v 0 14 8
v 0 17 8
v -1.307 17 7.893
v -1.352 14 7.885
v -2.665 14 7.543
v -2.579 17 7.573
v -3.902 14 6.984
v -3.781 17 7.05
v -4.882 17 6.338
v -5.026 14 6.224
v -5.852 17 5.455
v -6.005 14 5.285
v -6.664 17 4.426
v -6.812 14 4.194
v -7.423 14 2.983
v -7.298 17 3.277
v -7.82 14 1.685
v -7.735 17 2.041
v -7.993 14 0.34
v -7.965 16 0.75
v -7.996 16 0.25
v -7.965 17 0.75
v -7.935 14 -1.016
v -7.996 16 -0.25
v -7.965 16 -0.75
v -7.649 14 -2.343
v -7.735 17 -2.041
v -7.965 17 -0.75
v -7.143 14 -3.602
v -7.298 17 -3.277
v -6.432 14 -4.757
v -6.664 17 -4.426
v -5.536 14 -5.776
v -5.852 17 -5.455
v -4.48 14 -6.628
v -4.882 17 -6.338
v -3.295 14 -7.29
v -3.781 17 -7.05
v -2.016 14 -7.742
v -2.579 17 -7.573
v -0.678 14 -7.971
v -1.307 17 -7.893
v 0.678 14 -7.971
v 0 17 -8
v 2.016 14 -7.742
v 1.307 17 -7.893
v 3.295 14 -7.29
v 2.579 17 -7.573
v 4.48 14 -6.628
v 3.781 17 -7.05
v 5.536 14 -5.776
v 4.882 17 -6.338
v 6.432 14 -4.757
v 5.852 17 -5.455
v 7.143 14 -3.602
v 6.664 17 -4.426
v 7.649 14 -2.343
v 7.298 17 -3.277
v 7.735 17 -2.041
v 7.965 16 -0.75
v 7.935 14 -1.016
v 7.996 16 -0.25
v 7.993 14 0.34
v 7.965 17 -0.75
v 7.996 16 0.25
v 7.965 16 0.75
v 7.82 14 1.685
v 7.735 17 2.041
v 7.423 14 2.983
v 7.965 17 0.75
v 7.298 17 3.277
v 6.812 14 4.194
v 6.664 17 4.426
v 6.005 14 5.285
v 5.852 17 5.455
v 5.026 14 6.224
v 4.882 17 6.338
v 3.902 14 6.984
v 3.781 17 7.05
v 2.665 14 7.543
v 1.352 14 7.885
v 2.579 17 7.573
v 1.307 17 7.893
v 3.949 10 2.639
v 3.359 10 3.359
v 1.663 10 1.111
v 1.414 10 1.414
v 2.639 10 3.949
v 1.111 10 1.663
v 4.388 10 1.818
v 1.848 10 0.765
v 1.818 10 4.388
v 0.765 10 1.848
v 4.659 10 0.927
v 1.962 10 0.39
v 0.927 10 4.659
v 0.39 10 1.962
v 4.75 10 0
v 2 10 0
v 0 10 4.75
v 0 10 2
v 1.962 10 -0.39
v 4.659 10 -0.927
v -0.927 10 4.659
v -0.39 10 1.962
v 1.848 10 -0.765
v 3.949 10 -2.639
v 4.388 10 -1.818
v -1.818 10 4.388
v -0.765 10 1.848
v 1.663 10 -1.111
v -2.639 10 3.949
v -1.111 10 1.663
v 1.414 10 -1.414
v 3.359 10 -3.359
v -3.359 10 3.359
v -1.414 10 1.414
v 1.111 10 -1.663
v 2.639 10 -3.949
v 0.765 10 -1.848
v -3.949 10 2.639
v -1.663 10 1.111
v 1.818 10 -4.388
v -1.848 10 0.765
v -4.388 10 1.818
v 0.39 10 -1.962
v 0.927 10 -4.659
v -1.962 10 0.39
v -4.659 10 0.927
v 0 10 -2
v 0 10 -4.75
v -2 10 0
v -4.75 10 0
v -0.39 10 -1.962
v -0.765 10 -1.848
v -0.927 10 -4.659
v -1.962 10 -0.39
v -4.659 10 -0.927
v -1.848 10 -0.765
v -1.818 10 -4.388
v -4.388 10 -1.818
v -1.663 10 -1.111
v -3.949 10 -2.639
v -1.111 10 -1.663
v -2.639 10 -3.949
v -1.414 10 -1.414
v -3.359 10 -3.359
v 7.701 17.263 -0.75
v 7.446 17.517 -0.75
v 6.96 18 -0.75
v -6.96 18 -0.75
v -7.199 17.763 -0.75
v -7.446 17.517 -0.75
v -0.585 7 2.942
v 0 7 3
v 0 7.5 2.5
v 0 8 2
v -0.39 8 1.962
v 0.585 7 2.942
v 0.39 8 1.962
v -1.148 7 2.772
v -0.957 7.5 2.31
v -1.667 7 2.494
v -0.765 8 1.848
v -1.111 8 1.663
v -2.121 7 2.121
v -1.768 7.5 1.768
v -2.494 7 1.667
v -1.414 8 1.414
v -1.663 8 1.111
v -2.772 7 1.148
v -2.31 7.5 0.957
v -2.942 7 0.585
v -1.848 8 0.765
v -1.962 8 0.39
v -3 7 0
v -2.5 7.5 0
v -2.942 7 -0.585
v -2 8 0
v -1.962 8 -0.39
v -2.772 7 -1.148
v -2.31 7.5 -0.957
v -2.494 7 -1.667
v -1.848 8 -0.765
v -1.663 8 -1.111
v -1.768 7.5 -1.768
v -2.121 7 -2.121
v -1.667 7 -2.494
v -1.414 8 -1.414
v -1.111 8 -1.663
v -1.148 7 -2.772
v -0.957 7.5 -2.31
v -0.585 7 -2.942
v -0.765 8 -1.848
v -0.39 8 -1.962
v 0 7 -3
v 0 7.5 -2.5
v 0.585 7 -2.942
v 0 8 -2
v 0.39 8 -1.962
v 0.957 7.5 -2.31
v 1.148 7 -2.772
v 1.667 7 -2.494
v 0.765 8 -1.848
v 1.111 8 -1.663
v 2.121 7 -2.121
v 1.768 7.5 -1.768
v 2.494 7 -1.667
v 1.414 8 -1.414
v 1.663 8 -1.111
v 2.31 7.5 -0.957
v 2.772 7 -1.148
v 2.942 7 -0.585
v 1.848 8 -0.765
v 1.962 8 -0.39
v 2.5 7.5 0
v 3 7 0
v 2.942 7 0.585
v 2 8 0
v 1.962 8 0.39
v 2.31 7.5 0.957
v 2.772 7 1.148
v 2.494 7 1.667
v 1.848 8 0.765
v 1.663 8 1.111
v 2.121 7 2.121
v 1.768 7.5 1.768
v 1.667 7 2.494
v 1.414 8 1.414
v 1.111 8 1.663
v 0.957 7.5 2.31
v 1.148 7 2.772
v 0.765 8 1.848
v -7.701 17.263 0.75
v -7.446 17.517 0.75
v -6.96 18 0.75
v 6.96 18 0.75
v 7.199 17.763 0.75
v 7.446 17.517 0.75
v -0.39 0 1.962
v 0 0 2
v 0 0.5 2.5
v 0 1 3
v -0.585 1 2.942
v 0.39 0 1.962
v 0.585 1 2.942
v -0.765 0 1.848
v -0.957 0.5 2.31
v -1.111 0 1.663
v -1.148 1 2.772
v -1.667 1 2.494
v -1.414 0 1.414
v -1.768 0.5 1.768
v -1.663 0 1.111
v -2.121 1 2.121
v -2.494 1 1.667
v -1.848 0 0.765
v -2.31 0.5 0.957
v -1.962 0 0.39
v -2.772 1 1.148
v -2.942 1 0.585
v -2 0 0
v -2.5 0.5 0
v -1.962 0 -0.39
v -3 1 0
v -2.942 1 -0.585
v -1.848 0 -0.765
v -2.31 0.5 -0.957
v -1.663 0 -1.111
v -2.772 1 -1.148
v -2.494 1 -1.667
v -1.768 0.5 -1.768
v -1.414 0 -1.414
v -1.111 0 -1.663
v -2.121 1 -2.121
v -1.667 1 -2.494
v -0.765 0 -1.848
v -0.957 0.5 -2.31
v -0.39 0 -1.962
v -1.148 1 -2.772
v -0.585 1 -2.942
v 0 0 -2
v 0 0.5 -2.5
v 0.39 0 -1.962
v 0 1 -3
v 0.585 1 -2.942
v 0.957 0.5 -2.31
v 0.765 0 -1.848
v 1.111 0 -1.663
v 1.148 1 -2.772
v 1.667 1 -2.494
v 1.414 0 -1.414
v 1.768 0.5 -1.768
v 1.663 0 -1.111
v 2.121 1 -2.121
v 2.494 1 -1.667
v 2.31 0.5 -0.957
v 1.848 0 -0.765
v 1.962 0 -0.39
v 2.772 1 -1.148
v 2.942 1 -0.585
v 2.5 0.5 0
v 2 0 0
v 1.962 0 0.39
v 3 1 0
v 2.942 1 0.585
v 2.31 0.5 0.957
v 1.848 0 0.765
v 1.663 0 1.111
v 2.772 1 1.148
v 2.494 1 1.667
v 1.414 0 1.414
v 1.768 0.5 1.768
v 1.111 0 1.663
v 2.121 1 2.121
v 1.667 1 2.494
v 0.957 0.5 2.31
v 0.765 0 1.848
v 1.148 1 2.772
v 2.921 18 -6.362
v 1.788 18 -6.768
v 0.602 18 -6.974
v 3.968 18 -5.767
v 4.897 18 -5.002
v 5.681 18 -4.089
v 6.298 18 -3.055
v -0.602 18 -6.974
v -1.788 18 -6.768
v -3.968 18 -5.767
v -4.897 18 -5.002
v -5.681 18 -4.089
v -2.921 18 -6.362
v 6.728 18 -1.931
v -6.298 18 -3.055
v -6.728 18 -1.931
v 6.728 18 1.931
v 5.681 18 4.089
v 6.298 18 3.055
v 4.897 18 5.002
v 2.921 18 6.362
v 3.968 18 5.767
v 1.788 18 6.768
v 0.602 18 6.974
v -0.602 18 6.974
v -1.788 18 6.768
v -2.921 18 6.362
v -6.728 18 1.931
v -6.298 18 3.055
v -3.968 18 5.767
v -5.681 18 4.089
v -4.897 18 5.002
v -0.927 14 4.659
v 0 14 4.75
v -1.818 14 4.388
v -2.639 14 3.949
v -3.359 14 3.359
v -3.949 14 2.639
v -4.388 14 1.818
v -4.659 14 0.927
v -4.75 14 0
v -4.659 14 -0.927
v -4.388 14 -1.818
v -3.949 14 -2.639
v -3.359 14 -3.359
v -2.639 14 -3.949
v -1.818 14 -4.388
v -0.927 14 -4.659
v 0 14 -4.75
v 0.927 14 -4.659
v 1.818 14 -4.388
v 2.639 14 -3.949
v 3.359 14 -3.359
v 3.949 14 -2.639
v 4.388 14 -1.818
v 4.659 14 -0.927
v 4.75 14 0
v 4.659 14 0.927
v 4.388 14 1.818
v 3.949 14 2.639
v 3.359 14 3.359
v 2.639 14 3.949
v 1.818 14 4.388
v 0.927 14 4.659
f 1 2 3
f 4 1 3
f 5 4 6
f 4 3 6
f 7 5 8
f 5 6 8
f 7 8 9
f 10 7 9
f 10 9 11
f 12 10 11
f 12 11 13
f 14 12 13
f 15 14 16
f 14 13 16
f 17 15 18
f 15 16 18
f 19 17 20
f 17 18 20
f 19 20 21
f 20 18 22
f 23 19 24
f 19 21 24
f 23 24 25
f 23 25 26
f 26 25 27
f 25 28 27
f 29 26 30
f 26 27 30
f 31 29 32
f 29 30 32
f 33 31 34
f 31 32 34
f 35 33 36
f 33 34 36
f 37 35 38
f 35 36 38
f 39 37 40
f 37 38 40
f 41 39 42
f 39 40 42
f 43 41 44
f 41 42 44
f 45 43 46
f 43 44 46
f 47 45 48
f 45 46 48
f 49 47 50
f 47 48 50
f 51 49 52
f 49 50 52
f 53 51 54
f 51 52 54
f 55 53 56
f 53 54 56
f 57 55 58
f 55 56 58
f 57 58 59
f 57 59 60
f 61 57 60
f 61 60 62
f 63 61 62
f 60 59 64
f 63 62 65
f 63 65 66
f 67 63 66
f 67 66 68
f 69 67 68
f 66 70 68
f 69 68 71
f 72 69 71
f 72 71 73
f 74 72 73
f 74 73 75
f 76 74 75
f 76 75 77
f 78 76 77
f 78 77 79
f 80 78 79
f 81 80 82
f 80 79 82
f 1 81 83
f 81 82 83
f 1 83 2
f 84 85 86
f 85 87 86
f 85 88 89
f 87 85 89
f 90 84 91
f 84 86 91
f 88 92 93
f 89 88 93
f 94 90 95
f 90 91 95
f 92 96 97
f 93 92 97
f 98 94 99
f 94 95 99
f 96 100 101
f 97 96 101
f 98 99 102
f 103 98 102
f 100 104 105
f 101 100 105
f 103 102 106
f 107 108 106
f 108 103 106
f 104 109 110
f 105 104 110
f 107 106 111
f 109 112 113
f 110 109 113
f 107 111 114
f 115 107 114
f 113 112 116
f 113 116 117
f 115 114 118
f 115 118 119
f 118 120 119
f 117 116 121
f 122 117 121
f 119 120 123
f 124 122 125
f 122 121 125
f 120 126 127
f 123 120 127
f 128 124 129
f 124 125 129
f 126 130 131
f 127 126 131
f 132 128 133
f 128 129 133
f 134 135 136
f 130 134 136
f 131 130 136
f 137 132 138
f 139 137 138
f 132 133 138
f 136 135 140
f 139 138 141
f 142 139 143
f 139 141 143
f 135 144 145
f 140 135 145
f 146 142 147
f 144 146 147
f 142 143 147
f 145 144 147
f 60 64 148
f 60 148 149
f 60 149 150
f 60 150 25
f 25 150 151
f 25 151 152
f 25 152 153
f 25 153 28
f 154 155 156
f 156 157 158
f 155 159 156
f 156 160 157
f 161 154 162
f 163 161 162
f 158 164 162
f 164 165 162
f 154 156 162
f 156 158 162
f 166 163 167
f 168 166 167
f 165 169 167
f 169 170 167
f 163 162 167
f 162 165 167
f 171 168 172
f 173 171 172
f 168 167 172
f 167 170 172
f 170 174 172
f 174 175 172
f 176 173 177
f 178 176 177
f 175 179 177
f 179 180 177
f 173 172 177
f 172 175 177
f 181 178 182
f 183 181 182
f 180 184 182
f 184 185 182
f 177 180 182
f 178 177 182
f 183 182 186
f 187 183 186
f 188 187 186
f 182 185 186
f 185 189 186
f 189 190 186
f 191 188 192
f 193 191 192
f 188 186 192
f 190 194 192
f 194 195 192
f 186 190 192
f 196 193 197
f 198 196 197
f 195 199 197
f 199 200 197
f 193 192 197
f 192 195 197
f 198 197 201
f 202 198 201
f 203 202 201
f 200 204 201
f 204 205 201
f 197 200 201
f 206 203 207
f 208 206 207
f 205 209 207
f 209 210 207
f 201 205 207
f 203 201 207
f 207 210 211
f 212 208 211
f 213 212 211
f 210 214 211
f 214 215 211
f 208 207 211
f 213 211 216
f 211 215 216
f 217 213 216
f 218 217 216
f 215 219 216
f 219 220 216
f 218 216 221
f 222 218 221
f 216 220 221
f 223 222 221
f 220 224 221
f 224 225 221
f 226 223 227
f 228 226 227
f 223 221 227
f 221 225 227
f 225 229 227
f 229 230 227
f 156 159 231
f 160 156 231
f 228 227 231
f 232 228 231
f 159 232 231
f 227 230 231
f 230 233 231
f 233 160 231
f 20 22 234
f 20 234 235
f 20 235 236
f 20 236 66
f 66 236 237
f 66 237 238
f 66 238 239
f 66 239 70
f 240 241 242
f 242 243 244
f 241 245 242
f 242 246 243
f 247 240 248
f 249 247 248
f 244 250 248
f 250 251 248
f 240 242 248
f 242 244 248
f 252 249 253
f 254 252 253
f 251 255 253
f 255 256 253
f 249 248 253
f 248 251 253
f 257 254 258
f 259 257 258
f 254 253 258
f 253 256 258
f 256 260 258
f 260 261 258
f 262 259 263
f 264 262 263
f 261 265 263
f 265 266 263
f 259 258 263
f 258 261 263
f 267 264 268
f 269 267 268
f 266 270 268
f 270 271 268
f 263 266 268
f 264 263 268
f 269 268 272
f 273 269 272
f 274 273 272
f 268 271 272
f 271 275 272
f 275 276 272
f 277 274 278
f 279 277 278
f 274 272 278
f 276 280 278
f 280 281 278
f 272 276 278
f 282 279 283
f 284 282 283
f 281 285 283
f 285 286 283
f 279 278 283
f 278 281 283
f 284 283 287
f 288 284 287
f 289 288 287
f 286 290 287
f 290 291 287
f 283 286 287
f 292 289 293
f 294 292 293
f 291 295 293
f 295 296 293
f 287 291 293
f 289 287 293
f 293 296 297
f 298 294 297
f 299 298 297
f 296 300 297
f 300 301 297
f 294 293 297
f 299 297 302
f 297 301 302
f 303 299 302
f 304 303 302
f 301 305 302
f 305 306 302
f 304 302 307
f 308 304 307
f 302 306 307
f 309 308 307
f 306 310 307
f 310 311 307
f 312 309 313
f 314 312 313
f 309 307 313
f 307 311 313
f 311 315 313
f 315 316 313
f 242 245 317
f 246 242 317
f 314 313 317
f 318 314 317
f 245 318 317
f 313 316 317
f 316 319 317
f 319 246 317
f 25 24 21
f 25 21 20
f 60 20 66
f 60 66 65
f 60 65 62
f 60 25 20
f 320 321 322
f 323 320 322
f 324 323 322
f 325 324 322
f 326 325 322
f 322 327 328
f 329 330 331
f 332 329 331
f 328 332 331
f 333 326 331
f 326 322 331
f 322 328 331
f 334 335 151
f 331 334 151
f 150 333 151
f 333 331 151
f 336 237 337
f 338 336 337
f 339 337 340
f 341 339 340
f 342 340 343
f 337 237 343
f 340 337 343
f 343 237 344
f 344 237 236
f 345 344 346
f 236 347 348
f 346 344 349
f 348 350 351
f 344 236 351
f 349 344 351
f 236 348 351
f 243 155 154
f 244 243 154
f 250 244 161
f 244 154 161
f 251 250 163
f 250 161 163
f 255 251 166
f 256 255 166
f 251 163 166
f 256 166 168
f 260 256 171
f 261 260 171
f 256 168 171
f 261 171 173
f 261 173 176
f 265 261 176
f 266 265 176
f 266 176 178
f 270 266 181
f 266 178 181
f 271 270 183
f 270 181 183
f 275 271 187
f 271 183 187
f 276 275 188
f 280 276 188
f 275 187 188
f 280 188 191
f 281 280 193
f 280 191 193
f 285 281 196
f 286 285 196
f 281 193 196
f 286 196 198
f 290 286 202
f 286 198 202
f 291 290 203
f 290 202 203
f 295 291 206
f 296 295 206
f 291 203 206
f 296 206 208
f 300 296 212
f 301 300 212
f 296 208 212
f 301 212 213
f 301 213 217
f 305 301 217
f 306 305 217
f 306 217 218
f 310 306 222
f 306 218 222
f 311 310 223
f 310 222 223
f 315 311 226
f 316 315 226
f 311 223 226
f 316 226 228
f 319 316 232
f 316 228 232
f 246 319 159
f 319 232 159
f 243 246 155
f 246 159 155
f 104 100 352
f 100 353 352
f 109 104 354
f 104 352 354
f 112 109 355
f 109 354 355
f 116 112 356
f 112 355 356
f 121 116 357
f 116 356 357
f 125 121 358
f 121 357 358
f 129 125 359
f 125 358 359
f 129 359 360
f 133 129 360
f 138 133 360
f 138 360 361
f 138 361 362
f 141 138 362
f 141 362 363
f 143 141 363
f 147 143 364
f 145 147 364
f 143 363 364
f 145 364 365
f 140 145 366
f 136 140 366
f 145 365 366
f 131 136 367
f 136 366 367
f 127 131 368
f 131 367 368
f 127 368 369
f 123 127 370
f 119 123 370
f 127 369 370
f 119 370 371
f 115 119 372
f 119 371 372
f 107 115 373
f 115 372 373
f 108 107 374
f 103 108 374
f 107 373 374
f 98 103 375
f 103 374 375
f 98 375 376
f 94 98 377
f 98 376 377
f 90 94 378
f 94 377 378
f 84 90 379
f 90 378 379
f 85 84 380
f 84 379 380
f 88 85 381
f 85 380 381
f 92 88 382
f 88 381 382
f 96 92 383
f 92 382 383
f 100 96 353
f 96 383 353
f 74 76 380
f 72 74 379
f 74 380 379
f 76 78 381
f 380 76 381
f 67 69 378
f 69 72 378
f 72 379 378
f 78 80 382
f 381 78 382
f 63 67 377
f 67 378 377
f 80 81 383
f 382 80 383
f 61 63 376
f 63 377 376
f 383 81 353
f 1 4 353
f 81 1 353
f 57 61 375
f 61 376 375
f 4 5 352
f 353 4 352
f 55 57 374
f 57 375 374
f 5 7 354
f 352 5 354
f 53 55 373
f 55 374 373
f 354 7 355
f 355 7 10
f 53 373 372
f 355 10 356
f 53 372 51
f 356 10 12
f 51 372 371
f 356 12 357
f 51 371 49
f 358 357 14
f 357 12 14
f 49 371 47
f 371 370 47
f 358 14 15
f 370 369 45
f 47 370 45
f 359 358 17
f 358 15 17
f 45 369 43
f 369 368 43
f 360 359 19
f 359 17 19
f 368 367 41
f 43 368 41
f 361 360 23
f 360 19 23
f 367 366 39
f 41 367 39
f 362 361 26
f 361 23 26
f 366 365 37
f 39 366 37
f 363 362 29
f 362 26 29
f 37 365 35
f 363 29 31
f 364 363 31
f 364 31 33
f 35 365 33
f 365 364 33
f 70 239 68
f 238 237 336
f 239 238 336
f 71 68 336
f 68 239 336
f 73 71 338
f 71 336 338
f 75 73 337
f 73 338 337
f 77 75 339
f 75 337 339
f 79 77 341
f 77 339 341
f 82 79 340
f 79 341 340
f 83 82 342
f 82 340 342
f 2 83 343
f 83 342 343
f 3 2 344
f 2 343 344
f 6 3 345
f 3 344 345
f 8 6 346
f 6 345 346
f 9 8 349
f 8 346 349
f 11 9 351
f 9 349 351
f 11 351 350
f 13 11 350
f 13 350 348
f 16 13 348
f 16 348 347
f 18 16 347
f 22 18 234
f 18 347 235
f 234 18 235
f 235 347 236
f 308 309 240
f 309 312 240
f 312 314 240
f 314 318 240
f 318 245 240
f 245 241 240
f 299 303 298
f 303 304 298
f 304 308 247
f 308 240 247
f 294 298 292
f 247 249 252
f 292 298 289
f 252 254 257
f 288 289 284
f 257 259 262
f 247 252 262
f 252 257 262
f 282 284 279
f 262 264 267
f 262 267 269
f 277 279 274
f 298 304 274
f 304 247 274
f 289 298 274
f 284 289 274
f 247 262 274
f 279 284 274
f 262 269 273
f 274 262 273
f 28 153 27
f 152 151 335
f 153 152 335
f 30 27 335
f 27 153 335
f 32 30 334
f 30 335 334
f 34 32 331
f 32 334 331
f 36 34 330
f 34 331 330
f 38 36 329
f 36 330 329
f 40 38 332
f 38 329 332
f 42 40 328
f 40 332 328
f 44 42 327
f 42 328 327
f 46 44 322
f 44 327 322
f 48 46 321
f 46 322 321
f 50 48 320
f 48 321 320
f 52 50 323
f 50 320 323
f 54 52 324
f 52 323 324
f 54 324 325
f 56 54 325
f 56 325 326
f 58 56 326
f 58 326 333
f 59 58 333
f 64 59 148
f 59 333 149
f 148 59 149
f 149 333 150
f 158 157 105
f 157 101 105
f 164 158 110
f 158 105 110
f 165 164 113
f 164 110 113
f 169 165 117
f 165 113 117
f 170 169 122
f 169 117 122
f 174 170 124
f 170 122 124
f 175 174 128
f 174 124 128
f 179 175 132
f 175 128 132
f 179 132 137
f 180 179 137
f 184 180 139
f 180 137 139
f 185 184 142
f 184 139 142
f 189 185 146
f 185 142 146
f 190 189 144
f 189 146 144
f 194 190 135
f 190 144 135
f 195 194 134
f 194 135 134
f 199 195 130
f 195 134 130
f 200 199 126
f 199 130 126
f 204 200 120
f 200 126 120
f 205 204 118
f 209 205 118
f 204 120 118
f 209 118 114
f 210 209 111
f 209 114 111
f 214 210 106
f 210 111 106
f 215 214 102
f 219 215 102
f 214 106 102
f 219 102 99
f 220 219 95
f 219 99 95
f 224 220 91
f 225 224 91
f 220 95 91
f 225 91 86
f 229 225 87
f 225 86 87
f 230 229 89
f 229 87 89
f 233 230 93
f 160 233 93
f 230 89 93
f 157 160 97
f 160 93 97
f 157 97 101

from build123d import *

# Parameters (mm, degrees)
CHAMFER_2_SIZE      = 1
CUT_EXTRUDE_1_DEPTH = 2


with BuildPart() as part:
    # 草图1 → 旋转1 (revolve)
    with BuildSketch(Plane.XY, mode=Mode.PRIVATE) as revolve_1_sk:
        Polygon((0, 0), (3, 0), (3, 8), (2, 8), (2, 10), (4.75, 10), (4.75, 14), (8, 14), (8, 18), (0, 18), align=None)
    revolve(revolve_1_sk.sketch.rotate(Axis((0, 18, 0), (0, -1, 0)), 90), axis=Axis((0, 18, 0), (0, -1, 0)))

    # 倒角2
    chamfer_2_edges = [part.edges().sort_by_distance(p)[0] for p in [
        (0, 8, -3),
        (0, 0, -3),
        (0, 18, -8),
    ]]
    chamfer(chamfer_2_edges, length=CHAMFER_2_SIZE - 0.0001)  # a hair under: the kernel refuses the full size

    # 草图2 → 切除-拉伸1 (cut)
    with BuildSketch(Plane(origin=(0, 18, 0), x_dir=(1, 0, 0), z_dir=(0, 1, 0))):
        with BuildLine():
            Line((-7.964766161, -0.75), (7.964766161, -0.75))
            ThreePointArc((7.964766161, -0.75), (8, 0), (7.964766161, 0.75))
            Line((7.964766161, 0.75), (-7.964766161, 0.75))
            ThreePointArc((-7.964766161, 0.75), (-8, 0), (-7.964766161, -0.75))
        make_face()
    extrude(amount=-CUT_EXTRUDE_1_DEPTH, mode=Mode.SUBTRACT)


solid = part.part
